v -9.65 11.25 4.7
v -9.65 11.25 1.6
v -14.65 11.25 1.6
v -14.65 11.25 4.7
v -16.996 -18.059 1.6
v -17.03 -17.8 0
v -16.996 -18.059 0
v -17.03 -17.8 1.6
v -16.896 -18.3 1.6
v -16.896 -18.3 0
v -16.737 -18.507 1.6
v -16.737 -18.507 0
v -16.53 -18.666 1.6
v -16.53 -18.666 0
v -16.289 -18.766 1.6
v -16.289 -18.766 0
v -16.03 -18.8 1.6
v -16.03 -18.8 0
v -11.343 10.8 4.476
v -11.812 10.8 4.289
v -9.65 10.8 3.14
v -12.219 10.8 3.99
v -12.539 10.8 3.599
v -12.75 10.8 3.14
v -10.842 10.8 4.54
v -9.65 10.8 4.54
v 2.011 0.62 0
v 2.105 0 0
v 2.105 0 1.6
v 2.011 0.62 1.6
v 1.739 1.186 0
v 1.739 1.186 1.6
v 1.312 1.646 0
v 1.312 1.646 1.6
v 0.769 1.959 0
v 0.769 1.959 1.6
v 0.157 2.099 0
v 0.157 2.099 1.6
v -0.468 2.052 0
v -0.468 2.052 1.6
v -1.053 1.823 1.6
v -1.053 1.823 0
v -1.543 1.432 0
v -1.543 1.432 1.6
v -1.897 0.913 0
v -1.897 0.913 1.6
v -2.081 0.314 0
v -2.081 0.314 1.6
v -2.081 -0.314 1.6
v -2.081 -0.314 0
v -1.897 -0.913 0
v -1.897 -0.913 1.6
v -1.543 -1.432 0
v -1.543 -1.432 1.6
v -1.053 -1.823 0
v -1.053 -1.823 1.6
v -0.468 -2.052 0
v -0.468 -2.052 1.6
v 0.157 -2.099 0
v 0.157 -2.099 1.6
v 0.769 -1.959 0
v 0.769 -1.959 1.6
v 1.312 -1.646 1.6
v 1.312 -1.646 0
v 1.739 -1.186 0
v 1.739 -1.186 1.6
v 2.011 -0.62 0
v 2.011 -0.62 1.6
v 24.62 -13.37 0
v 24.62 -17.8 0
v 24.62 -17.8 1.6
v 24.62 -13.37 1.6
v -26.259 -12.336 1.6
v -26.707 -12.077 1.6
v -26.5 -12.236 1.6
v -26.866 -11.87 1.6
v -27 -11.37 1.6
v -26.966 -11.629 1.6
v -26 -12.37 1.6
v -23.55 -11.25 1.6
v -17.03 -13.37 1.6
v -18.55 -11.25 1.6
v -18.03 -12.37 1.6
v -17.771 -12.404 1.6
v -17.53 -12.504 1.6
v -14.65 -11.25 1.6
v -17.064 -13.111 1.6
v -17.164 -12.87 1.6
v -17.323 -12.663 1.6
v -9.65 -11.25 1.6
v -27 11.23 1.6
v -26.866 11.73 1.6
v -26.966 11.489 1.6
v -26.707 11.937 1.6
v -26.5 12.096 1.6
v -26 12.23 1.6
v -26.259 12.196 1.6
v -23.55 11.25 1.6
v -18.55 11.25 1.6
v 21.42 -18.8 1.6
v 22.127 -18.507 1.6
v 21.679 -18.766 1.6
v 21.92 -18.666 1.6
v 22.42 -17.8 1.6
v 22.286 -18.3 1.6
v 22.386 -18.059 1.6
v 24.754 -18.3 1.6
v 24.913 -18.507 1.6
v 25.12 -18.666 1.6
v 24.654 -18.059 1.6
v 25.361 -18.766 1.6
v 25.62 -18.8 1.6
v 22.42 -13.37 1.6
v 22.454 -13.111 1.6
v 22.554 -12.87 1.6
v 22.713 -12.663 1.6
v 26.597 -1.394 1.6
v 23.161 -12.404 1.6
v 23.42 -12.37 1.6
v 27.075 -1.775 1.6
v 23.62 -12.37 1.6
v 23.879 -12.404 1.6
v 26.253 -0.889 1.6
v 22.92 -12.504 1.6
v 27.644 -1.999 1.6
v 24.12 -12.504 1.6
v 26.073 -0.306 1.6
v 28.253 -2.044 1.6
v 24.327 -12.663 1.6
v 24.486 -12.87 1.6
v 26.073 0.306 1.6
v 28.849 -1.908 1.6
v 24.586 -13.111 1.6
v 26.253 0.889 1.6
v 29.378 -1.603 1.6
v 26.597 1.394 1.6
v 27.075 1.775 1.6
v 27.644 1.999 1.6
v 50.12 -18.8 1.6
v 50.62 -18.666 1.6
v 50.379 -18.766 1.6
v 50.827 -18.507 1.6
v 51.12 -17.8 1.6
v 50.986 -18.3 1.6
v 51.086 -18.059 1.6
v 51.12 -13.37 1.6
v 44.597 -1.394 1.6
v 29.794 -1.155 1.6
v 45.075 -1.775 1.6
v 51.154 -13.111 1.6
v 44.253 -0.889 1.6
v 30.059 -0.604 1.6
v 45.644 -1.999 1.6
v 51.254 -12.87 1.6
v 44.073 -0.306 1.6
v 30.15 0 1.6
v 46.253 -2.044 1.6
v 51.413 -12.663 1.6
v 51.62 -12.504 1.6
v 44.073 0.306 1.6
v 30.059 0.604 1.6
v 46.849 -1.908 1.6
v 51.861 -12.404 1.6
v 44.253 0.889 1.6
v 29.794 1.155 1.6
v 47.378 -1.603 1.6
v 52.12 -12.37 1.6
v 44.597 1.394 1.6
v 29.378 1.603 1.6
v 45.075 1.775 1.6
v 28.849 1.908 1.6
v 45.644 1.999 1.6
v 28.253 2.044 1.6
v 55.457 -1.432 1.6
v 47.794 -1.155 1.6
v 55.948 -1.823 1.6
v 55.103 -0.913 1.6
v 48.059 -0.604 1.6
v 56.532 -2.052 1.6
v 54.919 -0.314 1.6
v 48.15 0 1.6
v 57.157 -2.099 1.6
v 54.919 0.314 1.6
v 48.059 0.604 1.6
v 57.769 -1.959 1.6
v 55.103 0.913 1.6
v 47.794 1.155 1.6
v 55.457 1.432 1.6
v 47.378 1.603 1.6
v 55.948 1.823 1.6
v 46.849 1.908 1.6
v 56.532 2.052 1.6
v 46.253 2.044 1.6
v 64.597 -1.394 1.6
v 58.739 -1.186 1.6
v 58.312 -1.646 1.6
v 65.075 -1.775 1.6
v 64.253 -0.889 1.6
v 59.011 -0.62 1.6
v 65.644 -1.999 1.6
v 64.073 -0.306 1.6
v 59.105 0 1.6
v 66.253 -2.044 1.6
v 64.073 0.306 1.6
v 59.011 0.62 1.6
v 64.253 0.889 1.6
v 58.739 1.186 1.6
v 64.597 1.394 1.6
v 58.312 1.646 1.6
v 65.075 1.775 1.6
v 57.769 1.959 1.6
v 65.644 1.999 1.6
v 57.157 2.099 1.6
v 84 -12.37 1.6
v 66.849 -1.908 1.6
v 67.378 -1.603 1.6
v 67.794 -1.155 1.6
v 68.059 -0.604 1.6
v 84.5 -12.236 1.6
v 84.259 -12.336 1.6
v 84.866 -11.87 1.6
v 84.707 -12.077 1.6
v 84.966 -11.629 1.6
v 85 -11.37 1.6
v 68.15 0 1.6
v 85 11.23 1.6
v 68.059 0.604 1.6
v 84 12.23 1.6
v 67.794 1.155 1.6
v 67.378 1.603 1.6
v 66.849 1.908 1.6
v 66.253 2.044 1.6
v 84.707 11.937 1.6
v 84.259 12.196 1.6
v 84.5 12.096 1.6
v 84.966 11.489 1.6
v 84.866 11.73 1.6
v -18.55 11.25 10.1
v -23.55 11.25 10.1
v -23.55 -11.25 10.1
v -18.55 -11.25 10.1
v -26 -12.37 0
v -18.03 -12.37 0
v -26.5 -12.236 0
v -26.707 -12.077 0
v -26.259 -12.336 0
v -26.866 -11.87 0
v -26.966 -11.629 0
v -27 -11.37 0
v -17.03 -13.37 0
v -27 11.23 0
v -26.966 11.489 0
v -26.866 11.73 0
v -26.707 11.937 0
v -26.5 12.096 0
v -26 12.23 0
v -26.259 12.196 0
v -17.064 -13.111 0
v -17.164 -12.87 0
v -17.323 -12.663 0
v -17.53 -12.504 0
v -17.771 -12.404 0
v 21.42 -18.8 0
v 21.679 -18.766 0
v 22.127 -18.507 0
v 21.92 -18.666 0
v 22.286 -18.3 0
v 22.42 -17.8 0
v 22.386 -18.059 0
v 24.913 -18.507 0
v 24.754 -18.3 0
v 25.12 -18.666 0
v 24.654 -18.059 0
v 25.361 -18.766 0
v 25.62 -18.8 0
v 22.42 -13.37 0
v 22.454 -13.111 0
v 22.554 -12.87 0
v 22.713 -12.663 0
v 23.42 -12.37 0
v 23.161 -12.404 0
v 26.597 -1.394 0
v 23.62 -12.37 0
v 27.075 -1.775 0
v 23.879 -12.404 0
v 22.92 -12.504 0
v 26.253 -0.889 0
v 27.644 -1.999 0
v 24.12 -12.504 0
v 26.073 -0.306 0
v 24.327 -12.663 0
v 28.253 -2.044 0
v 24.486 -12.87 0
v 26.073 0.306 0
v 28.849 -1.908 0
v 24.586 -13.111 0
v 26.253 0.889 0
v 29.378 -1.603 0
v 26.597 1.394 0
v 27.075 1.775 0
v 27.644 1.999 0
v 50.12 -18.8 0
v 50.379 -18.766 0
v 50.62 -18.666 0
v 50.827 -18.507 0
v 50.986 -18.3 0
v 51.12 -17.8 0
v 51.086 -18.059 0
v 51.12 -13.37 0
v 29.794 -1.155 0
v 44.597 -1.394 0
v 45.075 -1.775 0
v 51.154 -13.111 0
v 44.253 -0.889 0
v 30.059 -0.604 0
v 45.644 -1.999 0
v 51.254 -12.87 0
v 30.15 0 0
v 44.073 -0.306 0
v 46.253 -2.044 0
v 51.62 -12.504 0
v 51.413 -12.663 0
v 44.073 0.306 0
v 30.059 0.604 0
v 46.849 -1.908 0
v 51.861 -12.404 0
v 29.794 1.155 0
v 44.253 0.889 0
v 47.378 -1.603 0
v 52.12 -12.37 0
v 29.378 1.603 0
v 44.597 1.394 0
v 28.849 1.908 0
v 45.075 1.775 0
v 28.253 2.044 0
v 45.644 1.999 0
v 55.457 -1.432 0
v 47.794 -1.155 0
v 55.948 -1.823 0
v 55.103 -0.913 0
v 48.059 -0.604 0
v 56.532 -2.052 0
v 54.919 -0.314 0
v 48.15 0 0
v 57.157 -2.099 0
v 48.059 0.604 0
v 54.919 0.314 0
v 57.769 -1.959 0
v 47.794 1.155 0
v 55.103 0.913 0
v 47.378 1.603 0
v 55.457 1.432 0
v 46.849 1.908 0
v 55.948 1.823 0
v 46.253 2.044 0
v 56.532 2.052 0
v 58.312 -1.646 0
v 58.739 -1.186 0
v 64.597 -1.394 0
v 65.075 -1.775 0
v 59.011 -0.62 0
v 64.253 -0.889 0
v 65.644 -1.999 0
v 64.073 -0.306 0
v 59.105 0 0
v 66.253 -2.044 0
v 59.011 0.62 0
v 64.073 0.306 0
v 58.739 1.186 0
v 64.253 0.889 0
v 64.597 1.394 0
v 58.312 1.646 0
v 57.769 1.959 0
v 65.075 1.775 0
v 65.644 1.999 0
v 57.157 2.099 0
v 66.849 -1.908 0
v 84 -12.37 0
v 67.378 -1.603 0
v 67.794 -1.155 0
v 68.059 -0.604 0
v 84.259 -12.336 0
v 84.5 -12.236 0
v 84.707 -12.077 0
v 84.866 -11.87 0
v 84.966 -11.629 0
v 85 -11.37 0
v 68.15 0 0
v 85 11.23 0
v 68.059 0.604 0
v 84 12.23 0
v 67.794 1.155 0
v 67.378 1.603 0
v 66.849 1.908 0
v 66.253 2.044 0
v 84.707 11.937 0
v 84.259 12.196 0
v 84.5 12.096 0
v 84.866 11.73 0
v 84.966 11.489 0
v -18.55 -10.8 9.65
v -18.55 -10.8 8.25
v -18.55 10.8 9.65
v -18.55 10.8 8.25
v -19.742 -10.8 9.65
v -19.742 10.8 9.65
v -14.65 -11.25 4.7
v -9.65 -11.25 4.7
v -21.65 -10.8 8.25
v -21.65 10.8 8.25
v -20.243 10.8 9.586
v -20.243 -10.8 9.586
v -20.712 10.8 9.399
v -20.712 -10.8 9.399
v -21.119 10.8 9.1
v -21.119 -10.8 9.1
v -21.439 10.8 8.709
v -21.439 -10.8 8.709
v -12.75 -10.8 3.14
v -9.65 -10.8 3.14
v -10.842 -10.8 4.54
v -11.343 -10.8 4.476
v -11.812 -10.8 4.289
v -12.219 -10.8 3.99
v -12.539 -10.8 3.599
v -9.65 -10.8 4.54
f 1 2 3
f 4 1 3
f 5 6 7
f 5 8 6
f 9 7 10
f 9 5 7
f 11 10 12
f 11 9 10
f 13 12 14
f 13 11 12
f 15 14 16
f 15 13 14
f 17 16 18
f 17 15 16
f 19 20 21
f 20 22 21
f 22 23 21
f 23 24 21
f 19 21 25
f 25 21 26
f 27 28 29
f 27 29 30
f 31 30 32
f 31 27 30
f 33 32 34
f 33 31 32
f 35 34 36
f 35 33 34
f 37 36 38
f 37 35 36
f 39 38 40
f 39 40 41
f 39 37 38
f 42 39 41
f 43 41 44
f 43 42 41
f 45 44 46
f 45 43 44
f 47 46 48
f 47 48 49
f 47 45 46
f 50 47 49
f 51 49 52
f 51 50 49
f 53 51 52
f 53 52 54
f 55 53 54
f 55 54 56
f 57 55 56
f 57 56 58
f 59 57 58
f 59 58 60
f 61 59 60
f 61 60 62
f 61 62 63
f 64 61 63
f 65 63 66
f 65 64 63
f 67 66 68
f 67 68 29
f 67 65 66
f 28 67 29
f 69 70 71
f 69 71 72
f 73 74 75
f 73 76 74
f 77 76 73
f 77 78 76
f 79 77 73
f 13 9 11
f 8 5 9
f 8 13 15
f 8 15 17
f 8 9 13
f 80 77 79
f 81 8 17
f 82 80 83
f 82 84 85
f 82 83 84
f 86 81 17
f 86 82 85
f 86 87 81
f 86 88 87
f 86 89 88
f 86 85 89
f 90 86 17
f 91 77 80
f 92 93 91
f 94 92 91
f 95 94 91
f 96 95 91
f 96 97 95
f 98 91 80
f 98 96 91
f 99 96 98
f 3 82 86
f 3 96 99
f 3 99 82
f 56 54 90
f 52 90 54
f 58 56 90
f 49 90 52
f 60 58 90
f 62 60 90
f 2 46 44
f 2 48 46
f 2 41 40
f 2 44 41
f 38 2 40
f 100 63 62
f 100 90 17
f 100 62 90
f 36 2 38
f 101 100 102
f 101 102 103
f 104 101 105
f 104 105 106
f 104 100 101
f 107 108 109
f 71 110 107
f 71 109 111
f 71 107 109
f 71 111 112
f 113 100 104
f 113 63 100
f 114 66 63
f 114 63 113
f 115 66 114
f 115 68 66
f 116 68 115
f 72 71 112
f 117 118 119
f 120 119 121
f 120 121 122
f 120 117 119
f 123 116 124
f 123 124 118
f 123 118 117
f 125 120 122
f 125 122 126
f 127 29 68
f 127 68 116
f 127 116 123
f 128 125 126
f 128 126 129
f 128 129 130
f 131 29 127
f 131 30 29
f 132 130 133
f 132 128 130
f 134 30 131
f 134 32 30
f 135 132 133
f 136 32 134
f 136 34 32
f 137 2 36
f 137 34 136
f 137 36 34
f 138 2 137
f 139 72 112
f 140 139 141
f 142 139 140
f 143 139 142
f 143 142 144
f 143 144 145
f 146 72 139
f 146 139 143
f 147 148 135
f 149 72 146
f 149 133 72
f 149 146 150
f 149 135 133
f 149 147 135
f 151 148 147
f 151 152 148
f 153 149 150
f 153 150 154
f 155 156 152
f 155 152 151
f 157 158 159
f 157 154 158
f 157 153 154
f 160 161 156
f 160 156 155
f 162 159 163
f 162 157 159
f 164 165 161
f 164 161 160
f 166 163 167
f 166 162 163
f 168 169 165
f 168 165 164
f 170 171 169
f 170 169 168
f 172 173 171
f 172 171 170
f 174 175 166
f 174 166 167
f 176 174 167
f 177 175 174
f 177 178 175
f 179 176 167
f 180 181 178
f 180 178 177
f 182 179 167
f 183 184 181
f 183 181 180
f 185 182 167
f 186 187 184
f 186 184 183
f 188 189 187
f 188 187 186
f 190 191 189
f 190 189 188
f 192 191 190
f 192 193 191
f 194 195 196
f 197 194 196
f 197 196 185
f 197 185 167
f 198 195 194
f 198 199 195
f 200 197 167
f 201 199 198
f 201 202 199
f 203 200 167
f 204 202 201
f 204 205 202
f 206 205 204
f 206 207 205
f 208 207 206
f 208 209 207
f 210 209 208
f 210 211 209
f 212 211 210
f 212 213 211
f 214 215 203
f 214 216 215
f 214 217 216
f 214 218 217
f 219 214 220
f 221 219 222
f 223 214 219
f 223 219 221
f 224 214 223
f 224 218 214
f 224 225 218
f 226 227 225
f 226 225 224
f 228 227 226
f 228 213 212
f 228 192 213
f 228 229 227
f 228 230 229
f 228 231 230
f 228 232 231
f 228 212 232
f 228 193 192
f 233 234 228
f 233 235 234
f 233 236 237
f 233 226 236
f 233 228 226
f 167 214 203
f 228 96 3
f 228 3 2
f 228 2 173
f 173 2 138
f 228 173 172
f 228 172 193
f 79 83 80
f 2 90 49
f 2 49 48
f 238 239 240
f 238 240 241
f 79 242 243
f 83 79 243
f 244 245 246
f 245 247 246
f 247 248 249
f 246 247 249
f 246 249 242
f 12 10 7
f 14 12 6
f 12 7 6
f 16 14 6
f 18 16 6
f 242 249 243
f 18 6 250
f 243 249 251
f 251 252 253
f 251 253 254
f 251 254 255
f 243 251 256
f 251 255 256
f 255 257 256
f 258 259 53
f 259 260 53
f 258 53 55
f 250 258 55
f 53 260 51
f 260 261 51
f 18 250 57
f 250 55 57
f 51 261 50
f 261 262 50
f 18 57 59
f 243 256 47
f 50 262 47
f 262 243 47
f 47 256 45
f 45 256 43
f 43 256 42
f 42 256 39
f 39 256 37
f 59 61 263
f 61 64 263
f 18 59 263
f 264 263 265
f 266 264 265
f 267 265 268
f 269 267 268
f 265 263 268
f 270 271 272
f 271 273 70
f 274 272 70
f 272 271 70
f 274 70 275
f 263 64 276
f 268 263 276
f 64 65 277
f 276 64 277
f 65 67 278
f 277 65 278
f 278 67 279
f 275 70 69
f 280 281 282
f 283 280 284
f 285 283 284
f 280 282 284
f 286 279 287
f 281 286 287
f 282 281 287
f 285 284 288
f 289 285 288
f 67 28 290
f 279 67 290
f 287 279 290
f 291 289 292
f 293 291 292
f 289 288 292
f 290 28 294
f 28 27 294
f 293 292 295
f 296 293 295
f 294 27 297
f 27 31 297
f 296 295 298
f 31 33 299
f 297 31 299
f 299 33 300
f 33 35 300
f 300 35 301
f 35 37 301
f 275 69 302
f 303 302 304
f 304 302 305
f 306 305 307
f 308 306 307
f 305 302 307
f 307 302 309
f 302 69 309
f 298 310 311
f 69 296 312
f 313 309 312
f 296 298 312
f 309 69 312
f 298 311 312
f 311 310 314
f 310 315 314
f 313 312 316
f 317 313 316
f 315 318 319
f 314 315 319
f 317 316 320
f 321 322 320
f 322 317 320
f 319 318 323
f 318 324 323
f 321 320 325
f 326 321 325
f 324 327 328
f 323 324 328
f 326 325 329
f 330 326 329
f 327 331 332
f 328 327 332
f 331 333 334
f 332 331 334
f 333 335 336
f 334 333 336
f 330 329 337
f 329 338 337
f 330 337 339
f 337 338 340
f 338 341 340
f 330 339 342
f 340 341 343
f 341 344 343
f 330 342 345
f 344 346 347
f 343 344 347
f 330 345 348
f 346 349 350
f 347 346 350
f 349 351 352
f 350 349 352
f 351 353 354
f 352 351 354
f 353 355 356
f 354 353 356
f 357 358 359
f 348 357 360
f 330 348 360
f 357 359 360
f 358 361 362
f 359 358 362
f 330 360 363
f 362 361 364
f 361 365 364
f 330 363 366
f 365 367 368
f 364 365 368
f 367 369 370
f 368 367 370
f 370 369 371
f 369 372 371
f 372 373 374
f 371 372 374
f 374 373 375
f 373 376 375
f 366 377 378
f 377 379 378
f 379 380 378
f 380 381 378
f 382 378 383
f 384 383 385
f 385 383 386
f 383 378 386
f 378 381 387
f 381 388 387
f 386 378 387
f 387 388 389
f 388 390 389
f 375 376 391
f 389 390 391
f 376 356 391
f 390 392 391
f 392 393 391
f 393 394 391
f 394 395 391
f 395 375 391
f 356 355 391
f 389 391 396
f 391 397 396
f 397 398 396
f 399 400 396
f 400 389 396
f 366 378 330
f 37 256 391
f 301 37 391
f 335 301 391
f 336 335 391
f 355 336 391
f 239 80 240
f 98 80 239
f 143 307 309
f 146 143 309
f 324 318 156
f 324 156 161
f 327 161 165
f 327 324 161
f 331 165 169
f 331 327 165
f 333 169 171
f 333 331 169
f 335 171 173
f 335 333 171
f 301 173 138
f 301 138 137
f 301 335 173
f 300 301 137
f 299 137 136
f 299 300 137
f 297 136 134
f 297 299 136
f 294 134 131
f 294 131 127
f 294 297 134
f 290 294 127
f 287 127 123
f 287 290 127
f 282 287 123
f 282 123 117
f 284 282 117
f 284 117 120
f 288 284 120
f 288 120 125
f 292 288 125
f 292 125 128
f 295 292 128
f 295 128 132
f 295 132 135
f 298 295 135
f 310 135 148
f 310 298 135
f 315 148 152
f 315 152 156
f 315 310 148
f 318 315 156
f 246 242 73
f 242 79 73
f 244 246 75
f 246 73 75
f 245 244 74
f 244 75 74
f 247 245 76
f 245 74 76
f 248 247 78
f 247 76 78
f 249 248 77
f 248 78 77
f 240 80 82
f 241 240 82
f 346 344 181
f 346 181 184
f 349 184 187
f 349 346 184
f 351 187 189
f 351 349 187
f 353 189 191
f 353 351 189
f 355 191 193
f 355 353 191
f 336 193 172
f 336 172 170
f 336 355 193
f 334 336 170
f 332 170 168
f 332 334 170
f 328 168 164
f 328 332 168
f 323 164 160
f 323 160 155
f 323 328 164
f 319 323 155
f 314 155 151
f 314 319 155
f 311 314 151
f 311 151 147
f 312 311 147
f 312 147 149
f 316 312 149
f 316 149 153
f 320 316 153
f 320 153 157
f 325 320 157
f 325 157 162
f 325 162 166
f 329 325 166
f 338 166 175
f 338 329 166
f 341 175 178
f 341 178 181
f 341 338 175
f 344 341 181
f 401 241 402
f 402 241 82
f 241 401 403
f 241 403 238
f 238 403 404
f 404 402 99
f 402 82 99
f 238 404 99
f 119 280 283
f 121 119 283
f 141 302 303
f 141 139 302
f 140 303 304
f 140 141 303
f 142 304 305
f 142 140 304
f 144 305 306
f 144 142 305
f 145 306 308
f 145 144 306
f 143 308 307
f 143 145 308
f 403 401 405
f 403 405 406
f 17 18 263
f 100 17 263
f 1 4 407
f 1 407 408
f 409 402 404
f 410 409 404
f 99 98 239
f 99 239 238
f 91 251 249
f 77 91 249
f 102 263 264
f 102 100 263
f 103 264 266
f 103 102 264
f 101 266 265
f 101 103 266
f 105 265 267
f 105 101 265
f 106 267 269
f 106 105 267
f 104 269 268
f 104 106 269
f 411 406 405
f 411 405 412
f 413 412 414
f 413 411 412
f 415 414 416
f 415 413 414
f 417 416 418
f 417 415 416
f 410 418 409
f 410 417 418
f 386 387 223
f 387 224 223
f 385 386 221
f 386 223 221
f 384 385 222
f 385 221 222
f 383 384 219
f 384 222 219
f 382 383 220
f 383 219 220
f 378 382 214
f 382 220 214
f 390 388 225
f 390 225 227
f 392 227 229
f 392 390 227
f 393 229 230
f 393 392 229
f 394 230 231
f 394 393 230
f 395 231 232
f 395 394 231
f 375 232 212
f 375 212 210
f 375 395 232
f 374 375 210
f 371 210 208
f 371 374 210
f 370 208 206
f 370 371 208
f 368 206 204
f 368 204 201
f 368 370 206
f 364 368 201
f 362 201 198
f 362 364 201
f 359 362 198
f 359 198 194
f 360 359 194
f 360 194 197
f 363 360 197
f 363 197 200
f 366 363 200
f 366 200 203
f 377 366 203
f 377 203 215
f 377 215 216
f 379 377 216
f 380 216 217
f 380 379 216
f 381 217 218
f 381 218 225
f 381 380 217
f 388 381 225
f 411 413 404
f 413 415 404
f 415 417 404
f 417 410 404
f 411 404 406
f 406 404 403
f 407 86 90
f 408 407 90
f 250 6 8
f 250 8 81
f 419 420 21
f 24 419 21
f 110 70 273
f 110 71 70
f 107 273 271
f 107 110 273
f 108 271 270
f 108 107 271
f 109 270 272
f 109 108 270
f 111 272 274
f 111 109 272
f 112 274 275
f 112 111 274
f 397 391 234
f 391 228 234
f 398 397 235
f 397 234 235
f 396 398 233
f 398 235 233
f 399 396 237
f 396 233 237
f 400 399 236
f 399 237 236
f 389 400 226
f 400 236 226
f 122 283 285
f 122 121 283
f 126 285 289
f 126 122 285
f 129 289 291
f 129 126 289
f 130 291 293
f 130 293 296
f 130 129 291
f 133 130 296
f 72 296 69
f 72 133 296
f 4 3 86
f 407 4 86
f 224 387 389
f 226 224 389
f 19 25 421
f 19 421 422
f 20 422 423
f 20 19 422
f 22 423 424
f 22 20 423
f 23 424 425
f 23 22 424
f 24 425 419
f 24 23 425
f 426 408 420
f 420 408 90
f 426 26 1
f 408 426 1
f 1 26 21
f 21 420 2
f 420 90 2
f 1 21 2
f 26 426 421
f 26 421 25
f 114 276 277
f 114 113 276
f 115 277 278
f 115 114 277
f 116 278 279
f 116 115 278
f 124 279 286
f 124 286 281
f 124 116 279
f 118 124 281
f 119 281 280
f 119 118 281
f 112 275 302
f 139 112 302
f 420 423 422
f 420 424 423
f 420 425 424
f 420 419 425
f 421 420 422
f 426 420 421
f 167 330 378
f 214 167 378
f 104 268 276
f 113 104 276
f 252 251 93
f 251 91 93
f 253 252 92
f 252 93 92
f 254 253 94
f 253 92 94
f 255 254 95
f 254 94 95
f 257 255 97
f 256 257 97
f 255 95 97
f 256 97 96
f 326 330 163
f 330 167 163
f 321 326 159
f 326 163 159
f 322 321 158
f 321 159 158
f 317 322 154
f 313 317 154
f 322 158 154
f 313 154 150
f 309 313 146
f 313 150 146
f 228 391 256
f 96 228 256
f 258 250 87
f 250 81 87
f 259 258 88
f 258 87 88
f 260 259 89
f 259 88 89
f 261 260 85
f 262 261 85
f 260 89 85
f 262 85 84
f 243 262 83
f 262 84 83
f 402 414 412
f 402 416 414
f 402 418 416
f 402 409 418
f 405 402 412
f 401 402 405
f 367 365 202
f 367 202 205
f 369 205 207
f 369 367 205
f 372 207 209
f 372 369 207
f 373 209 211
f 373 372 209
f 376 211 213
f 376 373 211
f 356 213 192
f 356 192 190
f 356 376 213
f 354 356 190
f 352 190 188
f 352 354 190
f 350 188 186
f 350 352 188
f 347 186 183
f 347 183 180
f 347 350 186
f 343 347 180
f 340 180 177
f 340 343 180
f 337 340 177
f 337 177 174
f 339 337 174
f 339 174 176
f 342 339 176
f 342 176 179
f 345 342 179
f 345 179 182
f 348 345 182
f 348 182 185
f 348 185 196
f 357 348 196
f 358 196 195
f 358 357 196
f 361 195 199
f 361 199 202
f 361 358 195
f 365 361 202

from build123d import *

# Parameters (mm, degrees)
F4_W         = 39.45
F4_H         = 6.43
F4_W_2       = 26.5
F4_R         = 2.105
F4_R_2       = 2.05
F5_DEPTH     = 1.6
F7_DEPTH     = 3.1
F6_W         = 5
F6_H         = 22.5
F8_DEPTH     = 8.5
F9_R         = 1
F10_W        = 21.6
F10_H        = 1.4
F11_DEPTH    = 3.1
F12_T1_DEPTH = 21.6
F13_W        = 21.6
F13_H        = 1.4
F14_DEPTH    = 3.1
F15_T1_DEPTH = 21.6


# Not quite as in the source:
# - a fillet or chamfer that OpenCascade refuses, or shapes differently, is made with other operations: its cross-section is extruded or revolved along the edge and cut away or added
# - a feature names something its author has since deleted; it is built from what else it names


with BuildPart() as f5:
    # F4 (on Top) → F5 (new body)
    with BuildSketch(Plane.XY):
        with Locations((2.695, -15.585)):
            Rectangle(F4_W, F4_H)
        with Locations((37.87, -15.585)):
            Rectangle(F4_W_2, F4_H)
        Polygon((85, 12.23), (-27, 12.23), (-27, -12.37), (-17.03, -12.37), (22.42, -12.37), (24.62, -12.37), (51.12, -12.37), (85, -12.37), align=None)
        Circle(F4_R, mode=Mode.SUBTRACT)
        with Locations((28.1, 0)):
            Circle(F4_R_2, mode=Mode.SUBTRACT)
        with Locations((46.1, 0)):
            Circle(F4_R_2, mode=Mode.SUBTRACT)
        with Locations((57, 0)):
            Circle(F4_R, mode=Mode.SUBTRACT)
        with Locations((66.1, 0)):
            Circle(F4_R_2, mode=Mode.SUBTRACT)
    extrude(amount=F5_DEPTH)

    # F6 (on face) → F7 (join)
    with BuildSketch(Plane.XY.offset(1.6)):
        Polygon((-9.65, 11.25), (-14.65, 11.25), (-14.65, -11.25), (-9.65, -11.25), (-9.65, 0), align=None)
    extrude(amount=F7_DEPTH)

    # F6 (on face) → F8 (join)
    with BuildSketch(Plane.XY.offset(1.6)):
        with Locations((-21.05, 0)):
            Rectangle(F6_W, F6_H)
    extrude(amount=F8_DEPTH)

    # F9
    f9_edges = [f5.edges().sort_by_distance(p)[0] for p in [
        (-27, -12.37, 0.8),
        (-17.03, -12.37, 0.8),
        (-17.03, -18.8, 0.8),
        (24.62, -12.37, 0.8),
        (24.62, -18.8, 0.8),
        (22.42, -18.8, 0.8),
        (51.12, -18.8, 0.8),
        (22.42, -12.37, 0.8),
        (51.12, -12.37, 0.8),
        (85, 12.23, 0.8),
        (-27, 12.23, 0.8),
        (85, -12.37, 0.8),
    ]]
    fillet(f9_edges, radius=F9_R)

    # F10 (on face) → F11 (cut)
    with BuildSketch(Plane.YZ.offset(-9.65)):
        with Locations((0, 3.84)):
            Rectangle(F10_W, F10_H)
    extrude(amount=-F11_DEPTH, mode=Mode.SUBTRACT)

    # F12: fillet of radius 2 on 1 edges, made by hand

    # F12_s2 → F12_t1 (join)
    with BuildSketch(Plane.XZ.offset(-10.8)):
        with BuildLine():
            ThreePointArc((-10.8421215972, 4.54), (-12.0253375538, 4.1524515497), (-12.75, 3.14))
            Line((-12.75, 3.14), (-12.75, 4.54))
            Line((-12.75, 4.54), (-10.8421215972, 4.54))
        make_face()
    extrude(amount=F12_T1_DEPTH)

    # F13 (on face) → F14 (cut)
    with BuildSketch(Plane.YZ.offset(-18.55)):
        with Locations((0, 8.95)):
            Rectangle(F13_W, F13_H)
    extrude(amount=-F14_DEPTH, mode=Mode.SUBTRACT)

    # F15: fillet of radius 2 on 1 edges, made by hand

    # F15_s2 → F15_t1 (join)
    with BuildSketch(Plane.XZ.offset(-10.8)):
        with BuildLine():
            ThreePointArc((-19.7421215972, 9.65), (-20.9253375538, 9.2624515497), (-21.65, 8.25))
            Line((-21.65, 8.25), (-21.65, 9.65))
            Line((-21.65, 9.65), (-19.7421215972, 9.65))
        make_face()
    extrude(amount=F15_T1_DEPTH)


solid = f5.part
